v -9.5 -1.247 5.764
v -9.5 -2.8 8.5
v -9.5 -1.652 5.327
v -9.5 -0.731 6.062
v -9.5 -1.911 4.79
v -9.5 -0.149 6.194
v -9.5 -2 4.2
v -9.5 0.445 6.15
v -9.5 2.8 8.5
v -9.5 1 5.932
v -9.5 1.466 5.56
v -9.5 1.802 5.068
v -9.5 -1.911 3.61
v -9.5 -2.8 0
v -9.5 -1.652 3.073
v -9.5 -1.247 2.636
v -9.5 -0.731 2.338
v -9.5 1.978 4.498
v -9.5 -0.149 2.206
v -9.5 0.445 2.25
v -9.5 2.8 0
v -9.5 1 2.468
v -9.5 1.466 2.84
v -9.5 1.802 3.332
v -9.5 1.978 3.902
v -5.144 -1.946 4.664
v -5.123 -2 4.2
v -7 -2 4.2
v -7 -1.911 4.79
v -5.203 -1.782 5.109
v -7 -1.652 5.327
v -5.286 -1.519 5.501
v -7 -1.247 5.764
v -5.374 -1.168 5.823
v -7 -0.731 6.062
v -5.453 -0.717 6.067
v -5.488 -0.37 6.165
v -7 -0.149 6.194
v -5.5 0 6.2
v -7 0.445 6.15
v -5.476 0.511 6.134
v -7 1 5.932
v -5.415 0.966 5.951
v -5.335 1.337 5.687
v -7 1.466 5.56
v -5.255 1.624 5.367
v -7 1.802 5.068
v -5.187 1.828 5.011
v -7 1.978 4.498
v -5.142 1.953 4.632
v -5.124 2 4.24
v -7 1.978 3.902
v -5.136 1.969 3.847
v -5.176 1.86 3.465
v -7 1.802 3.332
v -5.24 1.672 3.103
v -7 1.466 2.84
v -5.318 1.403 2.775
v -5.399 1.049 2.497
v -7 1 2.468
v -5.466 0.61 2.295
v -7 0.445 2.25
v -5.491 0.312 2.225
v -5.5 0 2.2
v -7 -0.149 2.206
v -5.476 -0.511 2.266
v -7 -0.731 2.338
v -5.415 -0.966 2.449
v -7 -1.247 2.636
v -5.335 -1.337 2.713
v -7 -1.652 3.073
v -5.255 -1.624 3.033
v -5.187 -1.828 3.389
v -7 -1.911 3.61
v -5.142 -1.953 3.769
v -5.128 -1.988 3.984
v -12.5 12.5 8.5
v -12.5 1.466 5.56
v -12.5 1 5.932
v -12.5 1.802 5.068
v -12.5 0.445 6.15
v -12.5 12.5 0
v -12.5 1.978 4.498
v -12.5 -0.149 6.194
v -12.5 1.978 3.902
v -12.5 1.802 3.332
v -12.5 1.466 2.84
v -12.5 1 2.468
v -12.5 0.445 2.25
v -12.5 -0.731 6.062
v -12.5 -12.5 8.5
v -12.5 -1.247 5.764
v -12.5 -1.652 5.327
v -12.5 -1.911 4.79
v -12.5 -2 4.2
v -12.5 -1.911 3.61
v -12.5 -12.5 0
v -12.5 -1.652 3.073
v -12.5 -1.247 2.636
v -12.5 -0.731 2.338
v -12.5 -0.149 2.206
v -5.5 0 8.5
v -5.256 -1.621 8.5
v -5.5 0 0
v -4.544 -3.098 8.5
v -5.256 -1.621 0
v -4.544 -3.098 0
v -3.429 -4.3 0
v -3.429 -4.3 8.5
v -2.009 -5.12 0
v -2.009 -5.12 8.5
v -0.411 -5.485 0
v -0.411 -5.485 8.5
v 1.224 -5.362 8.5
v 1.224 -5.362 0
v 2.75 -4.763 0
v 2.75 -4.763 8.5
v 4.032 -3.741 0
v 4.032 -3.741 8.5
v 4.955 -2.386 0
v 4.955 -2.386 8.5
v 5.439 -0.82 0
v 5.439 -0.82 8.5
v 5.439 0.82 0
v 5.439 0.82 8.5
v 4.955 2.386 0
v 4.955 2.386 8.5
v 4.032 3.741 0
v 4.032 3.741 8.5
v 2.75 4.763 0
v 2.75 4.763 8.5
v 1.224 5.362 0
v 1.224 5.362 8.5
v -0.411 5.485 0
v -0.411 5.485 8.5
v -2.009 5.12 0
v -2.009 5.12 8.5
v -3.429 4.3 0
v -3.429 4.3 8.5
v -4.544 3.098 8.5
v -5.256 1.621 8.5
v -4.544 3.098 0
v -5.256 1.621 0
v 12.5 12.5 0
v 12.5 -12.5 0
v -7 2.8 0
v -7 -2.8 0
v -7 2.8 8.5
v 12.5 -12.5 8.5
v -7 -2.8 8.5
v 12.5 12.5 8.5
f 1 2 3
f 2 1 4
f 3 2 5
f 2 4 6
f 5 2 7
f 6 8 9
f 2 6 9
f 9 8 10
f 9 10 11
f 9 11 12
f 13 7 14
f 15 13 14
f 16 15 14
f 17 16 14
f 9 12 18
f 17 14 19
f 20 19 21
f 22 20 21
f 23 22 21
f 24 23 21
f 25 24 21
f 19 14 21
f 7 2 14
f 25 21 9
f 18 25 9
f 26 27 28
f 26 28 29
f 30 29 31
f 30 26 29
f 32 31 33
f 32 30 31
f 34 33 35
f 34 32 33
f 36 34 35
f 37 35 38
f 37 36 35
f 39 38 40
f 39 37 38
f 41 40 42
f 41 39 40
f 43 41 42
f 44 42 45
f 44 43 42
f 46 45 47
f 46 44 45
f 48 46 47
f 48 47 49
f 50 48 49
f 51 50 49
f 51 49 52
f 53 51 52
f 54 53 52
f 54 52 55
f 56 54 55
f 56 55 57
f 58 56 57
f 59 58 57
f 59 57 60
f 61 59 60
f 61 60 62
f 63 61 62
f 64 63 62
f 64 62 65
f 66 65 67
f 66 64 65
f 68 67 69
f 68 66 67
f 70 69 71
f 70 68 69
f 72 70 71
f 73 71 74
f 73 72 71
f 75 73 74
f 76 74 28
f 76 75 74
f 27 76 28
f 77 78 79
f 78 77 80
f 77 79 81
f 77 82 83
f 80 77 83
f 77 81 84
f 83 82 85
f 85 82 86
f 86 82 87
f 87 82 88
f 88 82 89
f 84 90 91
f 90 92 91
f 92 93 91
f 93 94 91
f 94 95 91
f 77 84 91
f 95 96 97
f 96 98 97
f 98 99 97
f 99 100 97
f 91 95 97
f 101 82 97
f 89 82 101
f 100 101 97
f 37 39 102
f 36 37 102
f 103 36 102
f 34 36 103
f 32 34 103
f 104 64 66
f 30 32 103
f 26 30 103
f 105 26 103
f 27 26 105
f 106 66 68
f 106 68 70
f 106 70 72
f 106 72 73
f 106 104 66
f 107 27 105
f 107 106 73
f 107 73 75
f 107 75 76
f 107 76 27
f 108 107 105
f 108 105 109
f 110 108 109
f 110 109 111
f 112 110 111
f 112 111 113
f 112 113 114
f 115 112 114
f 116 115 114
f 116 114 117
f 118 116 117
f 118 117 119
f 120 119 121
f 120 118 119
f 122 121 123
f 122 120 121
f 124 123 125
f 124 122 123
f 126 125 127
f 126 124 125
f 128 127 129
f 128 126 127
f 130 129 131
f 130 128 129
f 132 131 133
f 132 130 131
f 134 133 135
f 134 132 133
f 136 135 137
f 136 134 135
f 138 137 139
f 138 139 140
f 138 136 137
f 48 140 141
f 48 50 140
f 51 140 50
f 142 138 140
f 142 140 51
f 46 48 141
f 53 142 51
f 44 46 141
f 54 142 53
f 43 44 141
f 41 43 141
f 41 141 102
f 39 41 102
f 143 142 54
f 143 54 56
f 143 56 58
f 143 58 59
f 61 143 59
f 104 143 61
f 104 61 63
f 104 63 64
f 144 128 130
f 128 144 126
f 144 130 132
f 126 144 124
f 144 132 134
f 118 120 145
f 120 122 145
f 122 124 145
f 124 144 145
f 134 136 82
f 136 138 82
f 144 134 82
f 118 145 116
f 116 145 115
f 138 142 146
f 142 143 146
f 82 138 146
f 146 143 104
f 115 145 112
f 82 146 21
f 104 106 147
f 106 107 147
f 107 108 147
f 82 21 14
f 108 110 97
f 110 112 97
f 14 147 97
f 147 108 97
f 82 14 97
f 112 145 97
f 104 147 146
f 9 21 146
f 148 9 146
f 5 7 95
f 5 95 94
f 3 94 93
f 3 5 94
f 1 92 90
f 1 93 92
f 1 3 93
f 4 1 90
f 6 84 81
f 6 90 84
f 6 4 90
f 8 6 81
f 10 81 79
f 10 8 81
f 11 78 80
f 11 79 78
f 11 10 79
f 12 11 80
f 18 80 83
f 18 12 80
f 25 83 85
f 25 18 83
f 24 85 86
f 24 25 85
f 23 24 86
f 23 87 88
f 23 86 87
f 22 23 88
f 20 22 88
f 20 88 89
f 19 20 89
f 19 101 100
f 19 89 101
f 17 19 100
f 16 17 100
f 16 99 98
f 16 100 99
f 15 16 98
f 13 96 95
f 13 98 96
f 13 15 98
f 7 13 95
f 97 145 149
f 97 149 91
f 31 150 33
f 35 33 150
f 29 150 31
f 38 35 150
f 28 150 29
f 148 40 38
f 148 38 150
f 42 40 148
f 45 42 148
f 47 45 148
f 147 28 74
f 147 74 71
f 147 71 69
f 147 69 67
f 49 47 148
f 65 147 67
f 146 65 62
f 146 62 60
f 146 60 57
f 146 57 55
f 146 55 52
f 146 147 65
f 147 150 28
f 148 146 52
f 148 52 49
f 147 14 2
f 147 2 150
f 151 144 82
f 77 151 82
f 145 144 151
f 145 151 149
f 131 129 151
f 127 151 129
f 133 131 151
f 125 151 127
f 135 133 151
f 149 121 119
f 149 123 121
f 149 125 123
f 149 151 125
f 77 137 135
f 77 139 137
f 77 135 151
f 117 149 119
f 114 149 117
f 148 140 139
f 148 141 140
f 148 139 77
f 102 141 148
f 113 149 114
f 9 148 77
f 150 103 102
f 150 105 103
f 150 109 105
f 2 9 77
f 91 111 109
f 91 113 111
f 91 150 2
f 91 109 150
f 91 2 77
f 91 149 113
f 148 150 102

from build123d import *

# Parameters (mm, degrees)
SKETCH002_W         = 2.5
SKETCH002_H         = 5.6
EXTRUDE002_DEPTH    = 10
SKETCH001_R         = 2
EXTRUDE001_DEPTH    = 10
SKETCH_W            = 25
SKETCH_H            = 25
SKETCH_R            = 5.5
EXTRUDE_DEPTH       = 8.5
CUT_PLACEMENT_ANGLE = 180


with BuildPart() as extrude002:
    # Sketch002 → Extrude002 (new body)
    with BuildSketch(Plane.XY):
        with Locations((-8.25, 0)):
            Rectangle(SKETCH002_W, SKETCH002_H)
    extrude(amount=EXTRUDE002_DEPTH)


with BuildPart() as extrude002_1:
    # Extrude002 placement: moved
    add(extrude002.part.moved(Location((0, 0, -1))))


with BuildPart() as extrude001:
    # Sketch001 → Extrude001 (new body)
    with BuildSketch(Plane.YZ.offset(12.5)):
        with Locations((0, 4.2)):
            Circle(SKETCH001_R)
    extrude(amount=EXTRUDE001_DEPTH)


with BuildPart() as extrude001_1:
    # Extrude001 placement: moved
    add(extrude001.part.moved(Location((-8, 0, 0))))


with BuildPart() as cut001:
    # Sketch → Extrude (new body)
    with BuildSketch(Plane.XY):
        Rectangle(SKETCH_W, SKETCH_H)
        Circle(SKETCH_R, mode=Mode.SUBTRACT)
    extrude(amount=EXTRUDE_DEPTH)

    # Cut: cut Extrude001
    add(extrude001_1.part, mode=Mode.SUBTRACT)


with BuildPart() as cut001_1:
    # Cut placement: moved
    add(cut001.part.rotate(Axis((0, 0, 0), (0, 0, 1)), CUT_PLACEMENT_ANGLE))

    # Cut001: cut Extrude002
    add(extrude002_1.part, mode=Mode.SUBTRACT)


solid = cut001_1.part
